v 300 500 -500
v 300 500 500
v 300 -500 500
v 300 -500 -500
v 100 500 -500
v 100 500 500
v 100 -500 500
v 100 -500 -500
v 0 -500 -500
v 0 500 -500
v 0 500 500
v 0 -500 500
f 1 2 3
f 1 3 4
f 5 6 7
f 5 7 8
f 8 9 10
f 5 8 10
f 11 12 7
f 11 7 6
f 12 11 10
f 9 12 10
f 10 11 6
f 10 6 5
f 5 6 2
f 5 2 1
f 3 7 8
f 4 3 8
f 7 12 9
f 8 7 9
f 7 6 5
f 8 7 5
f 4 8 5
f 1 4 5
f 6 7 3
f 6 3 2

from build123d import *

# Parameters (mm, degrees)
SKETCH1_W           = 1000
SKETCH1_H           = 1000
BOSS_EXTRUDE1_DEPTH = 100
SKETCH2_W           = 1000
SKETCH2_H           = 1000
BOSS_EXTRUDE2_DEPTH = 200


with BuildPart() as part:
    # Sketch1 → Boss-Extrude1 (new body)
    with BuildSketch(Plane(origin=(0, 0, 0), x_dir=(0, 0, -1), z_dir=(1, 0, 0))):
        Rectangle(SKETCH1_W, SKETCH1_H)
    extrude(amount=BOSS_EXTRUDE1_DEPTH)


with BuildPart() as body_2:
    # Sketch2 → Boss-Extrude2 (new body)
    with BuildSketch(Plane(origin=(100, 0, 0), x_dir=(0, 0, -1), z_dir=(1, 0, 0))):
        Rectangle(SKETCH2_W, SKETCH2_H)
    extrude(amount=BOSS_EXTRUDE2_DEPTH)


solid = Compound([part.part, body_2.part])
